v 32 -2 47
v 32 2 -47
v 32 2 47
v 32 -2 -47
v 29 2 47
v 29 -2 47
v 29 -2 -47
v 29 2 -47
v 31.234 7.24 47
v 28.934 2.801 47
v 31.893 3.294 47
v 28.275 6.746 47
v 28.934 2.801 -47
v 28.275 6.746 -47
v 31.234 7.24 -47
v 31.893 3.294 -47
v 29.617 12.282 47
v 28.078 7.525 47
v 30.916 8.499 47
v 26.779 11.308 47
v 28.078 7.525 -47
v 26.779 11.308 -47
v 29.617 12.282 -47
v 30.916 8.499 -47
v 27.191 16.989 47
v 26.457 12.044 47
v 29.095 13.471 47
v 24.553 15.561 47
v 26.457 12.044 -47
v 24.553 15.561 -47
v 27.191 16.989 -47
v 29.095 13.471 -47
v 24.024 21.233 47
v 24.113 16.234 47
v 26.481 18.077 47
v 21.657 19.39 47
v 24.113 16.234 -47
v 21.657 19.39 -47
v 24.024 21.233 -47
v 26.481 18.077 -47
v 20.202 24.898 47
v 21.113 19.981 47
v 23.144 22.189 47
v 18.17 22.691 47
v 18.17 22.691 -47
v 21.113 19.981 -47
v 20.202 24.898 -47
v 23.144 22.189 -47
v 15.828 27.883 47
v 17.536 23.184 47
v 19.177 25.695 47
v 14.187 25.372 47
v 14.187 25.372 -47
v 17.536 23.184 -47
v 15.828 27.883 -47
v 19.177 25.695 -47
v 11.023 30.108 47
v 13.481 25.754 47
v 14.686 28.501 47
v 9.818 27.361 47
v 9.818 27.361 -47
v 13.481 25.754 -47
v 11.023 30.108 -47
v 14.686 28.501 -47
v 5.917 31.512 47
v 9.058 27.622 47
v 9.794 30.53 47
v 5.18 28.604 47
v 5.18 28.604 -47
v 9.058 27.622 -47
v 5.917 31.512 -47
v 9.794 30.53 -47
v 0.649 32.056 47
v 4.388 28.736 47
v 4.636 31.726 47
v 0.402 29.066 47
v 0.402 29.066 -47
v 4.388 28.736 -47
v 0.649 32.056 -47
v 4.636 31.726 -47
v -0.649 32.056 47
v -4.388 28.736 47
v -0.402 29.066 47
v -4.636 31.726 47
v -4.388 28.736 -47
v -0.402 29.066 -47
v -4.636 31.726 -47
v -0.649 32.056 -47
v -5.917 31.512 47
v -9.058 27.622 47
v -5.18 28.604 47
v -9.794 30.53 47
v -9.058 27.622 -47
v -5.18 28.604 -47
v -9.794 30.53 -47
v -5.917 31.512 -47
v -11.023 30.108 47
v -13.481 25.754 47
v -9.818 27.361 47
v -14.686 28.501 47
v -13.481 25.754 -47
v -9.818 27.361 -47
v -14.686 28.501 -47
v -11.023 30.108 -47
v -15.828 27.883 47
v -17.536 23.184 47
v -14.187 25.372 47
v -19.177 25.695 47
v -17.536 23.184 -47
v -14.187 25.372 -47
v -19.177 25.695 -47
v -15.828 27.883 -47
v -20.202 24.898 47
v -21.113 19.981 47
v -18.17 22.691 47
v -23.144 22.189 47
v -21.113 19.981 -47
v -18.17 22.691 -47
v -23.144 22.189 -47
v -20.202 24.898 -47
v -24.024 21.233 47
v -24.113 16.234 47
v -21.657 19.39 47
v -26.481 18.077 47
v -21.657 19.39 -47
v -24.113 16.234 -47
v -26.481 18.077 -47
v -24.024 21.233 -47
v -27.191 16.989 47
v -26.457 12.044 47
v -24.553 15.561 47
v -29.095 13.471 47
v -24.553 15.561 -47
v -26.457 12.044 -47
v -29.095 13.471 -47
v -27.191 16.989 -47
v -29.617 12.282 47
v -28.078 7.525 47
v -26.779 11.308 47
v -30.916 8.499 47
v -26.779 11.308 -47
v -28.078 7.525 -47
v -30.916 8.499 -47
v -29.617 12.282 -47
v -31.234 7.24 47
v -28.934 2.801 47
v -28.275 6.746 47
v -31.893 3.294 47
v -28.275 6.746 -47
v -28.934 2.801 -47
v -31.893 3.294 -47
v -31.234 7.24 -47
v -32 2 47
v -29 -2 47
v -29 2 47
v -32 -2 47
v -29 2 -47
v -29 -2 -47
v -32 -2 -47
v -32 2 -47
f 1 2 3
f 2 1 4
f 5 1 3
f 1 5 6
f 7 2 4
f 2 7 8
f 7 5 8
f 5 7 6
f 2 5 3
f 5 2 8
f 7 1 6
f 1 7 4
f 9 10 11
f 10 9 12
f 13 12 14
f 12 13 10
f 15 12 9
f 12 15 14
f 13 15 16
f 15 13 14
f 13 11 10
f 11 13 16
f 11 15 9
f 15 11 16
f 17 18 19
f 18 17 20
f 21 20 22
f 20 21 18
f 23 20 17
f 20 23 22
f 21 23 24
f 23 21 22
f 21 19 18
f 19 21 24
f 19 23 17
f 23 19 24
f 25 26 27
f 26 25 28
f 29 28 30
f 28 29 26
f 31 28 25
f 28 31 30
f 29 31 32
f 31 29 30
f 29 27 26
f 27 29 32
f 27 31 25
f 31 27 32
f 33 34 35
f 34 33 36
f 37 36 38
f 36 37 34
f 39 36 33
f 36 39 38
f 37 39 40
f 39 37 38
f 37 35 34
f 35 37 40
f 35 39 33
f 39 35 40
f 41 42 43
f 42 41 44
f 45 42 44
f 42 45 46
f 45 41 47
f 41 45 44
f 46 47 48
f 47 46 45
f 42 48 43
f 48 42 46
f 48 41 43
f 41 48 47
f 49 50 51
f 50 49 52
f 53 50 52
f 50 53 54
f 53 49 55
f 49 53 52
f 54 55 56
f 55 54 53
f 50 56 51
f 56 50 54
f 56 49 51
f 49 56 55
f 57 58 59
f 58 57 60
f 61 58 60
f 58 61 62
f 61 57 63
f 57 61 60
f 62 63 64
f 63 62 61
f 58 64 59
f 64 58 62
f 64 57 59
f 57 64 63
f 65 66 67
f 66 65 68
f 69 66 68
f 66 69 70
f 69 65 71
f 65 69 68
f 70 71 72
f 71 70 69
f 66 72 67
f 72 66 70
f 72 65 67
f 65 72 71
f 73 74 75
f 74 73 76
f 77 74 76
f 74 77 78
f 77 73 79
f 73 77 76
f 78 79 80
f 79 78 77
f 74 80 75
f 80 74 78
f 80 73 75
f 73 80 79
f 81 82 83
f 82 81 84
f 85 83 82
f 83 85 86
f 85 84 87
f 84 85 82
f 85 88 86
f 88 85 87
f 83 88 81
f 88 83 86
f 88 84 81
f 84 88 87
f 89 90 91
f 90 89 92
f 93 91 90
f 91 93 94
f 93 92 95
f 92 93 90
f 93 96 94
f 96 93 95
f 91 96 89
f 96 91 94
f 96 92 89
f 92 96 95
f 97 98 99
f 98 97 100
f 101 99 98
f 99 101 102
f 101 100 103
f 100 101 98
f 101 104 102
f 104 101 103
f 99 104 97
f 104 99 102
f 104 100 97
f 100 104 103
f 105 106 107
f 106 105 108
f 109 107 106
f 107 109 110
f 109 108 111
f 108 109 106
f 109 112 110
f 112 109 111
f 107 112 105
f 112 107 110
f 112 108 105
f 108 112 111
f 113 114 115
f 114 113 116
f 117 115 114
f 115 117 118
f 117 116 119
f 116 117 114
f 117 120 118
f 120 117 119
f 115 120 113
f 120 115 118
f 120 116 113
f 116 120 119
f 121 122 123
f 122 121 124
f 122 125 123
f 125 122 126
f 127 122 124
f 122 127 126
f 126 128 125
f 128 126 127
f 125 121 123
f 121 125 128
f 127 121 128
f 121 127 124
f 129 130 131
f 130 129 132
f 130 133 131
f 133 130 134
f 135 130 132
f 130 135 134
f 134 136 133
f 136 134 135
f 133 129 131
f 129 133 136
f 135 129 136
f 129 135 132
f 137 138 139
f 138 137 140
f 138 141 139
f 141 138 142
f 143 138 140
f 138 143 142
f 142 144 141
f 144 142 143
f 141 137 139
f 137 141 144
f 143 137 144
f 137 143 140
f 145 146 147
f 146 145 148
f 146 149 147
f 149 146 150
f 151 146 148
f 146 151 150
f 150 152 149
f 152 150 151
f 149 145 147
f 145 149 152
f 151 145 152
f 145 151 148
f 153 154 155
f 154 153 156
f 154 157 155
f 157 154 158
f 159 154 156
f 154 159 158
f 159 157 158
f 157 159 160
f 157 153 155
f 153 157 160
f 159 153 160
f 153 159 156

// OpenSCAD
// file: measures.scad
/**
 * Pencil box configuration
 * All measures in millimeters
 */

// rendering parameters
$fn = 200;
nothing = 0.005;

// material to cut from
material_x = 350;
material_y = 180;
material_z = 3;

// total size of the box
box_x = 130;
box_y = 70;
box_z = 100;

// measures of the two half circles left and right
curvature_y = box_y;
curvature_x = curvature_y/2;

// measure of rectangle between half circles
rect_x = box_x - 2*curvature_x;
rect_y = box_y;

top_opening_inset = 5.7*material_z;

wall_z = box_z - 2*material_z;

// distance between wall and outer edge
wall_inset = material_z;

curve_radius = box_y/2 - wall_inset - material_z;
curve_length = curve_radius*PI;

// total wall length without anchor
wall_length = 2*rect_x + 2*curve_length;

// nose properties
nose_x = 2*material_z;
nose_z = material_z;

// anchor
anchor_width = 10;
anchor_height = 30;
anchor_length = 20;

// for preview
pillar_count = 20;
pillar_angle = 180 / (pillar_count-1);
pillar_width = 4;

part_spacing = 1;
// main file
include <measures.scad>;

module pillar()
{
    translate([
        curvature_y/2 - material_z/2 - wall_inset,
        0,
        0
        ])
    cube([
        material_z,
        pillar_width,
        wall_z
        ], center=true);
}

module curvature()
{
    for (i=[0:pillar_count-1])
    {
        rotate([
            0,
            0,
            i*pillar_angle
            ])
        pillar();
    }
}

module curvature_left()
{
    translate([
        - rect_x/2,
        0,
        wall_z/2 + material_z
        ])
    rotate([
        0,
        0,
        90
        ])
    curvature();
}

module curvature_right()
{
    translate([
        + rect_x/2,
        0,
        wall_z/2 + material_z
        ])
    rotate([
        0,
        0,
        -90
        ])
    curvature();
}

curvature();
